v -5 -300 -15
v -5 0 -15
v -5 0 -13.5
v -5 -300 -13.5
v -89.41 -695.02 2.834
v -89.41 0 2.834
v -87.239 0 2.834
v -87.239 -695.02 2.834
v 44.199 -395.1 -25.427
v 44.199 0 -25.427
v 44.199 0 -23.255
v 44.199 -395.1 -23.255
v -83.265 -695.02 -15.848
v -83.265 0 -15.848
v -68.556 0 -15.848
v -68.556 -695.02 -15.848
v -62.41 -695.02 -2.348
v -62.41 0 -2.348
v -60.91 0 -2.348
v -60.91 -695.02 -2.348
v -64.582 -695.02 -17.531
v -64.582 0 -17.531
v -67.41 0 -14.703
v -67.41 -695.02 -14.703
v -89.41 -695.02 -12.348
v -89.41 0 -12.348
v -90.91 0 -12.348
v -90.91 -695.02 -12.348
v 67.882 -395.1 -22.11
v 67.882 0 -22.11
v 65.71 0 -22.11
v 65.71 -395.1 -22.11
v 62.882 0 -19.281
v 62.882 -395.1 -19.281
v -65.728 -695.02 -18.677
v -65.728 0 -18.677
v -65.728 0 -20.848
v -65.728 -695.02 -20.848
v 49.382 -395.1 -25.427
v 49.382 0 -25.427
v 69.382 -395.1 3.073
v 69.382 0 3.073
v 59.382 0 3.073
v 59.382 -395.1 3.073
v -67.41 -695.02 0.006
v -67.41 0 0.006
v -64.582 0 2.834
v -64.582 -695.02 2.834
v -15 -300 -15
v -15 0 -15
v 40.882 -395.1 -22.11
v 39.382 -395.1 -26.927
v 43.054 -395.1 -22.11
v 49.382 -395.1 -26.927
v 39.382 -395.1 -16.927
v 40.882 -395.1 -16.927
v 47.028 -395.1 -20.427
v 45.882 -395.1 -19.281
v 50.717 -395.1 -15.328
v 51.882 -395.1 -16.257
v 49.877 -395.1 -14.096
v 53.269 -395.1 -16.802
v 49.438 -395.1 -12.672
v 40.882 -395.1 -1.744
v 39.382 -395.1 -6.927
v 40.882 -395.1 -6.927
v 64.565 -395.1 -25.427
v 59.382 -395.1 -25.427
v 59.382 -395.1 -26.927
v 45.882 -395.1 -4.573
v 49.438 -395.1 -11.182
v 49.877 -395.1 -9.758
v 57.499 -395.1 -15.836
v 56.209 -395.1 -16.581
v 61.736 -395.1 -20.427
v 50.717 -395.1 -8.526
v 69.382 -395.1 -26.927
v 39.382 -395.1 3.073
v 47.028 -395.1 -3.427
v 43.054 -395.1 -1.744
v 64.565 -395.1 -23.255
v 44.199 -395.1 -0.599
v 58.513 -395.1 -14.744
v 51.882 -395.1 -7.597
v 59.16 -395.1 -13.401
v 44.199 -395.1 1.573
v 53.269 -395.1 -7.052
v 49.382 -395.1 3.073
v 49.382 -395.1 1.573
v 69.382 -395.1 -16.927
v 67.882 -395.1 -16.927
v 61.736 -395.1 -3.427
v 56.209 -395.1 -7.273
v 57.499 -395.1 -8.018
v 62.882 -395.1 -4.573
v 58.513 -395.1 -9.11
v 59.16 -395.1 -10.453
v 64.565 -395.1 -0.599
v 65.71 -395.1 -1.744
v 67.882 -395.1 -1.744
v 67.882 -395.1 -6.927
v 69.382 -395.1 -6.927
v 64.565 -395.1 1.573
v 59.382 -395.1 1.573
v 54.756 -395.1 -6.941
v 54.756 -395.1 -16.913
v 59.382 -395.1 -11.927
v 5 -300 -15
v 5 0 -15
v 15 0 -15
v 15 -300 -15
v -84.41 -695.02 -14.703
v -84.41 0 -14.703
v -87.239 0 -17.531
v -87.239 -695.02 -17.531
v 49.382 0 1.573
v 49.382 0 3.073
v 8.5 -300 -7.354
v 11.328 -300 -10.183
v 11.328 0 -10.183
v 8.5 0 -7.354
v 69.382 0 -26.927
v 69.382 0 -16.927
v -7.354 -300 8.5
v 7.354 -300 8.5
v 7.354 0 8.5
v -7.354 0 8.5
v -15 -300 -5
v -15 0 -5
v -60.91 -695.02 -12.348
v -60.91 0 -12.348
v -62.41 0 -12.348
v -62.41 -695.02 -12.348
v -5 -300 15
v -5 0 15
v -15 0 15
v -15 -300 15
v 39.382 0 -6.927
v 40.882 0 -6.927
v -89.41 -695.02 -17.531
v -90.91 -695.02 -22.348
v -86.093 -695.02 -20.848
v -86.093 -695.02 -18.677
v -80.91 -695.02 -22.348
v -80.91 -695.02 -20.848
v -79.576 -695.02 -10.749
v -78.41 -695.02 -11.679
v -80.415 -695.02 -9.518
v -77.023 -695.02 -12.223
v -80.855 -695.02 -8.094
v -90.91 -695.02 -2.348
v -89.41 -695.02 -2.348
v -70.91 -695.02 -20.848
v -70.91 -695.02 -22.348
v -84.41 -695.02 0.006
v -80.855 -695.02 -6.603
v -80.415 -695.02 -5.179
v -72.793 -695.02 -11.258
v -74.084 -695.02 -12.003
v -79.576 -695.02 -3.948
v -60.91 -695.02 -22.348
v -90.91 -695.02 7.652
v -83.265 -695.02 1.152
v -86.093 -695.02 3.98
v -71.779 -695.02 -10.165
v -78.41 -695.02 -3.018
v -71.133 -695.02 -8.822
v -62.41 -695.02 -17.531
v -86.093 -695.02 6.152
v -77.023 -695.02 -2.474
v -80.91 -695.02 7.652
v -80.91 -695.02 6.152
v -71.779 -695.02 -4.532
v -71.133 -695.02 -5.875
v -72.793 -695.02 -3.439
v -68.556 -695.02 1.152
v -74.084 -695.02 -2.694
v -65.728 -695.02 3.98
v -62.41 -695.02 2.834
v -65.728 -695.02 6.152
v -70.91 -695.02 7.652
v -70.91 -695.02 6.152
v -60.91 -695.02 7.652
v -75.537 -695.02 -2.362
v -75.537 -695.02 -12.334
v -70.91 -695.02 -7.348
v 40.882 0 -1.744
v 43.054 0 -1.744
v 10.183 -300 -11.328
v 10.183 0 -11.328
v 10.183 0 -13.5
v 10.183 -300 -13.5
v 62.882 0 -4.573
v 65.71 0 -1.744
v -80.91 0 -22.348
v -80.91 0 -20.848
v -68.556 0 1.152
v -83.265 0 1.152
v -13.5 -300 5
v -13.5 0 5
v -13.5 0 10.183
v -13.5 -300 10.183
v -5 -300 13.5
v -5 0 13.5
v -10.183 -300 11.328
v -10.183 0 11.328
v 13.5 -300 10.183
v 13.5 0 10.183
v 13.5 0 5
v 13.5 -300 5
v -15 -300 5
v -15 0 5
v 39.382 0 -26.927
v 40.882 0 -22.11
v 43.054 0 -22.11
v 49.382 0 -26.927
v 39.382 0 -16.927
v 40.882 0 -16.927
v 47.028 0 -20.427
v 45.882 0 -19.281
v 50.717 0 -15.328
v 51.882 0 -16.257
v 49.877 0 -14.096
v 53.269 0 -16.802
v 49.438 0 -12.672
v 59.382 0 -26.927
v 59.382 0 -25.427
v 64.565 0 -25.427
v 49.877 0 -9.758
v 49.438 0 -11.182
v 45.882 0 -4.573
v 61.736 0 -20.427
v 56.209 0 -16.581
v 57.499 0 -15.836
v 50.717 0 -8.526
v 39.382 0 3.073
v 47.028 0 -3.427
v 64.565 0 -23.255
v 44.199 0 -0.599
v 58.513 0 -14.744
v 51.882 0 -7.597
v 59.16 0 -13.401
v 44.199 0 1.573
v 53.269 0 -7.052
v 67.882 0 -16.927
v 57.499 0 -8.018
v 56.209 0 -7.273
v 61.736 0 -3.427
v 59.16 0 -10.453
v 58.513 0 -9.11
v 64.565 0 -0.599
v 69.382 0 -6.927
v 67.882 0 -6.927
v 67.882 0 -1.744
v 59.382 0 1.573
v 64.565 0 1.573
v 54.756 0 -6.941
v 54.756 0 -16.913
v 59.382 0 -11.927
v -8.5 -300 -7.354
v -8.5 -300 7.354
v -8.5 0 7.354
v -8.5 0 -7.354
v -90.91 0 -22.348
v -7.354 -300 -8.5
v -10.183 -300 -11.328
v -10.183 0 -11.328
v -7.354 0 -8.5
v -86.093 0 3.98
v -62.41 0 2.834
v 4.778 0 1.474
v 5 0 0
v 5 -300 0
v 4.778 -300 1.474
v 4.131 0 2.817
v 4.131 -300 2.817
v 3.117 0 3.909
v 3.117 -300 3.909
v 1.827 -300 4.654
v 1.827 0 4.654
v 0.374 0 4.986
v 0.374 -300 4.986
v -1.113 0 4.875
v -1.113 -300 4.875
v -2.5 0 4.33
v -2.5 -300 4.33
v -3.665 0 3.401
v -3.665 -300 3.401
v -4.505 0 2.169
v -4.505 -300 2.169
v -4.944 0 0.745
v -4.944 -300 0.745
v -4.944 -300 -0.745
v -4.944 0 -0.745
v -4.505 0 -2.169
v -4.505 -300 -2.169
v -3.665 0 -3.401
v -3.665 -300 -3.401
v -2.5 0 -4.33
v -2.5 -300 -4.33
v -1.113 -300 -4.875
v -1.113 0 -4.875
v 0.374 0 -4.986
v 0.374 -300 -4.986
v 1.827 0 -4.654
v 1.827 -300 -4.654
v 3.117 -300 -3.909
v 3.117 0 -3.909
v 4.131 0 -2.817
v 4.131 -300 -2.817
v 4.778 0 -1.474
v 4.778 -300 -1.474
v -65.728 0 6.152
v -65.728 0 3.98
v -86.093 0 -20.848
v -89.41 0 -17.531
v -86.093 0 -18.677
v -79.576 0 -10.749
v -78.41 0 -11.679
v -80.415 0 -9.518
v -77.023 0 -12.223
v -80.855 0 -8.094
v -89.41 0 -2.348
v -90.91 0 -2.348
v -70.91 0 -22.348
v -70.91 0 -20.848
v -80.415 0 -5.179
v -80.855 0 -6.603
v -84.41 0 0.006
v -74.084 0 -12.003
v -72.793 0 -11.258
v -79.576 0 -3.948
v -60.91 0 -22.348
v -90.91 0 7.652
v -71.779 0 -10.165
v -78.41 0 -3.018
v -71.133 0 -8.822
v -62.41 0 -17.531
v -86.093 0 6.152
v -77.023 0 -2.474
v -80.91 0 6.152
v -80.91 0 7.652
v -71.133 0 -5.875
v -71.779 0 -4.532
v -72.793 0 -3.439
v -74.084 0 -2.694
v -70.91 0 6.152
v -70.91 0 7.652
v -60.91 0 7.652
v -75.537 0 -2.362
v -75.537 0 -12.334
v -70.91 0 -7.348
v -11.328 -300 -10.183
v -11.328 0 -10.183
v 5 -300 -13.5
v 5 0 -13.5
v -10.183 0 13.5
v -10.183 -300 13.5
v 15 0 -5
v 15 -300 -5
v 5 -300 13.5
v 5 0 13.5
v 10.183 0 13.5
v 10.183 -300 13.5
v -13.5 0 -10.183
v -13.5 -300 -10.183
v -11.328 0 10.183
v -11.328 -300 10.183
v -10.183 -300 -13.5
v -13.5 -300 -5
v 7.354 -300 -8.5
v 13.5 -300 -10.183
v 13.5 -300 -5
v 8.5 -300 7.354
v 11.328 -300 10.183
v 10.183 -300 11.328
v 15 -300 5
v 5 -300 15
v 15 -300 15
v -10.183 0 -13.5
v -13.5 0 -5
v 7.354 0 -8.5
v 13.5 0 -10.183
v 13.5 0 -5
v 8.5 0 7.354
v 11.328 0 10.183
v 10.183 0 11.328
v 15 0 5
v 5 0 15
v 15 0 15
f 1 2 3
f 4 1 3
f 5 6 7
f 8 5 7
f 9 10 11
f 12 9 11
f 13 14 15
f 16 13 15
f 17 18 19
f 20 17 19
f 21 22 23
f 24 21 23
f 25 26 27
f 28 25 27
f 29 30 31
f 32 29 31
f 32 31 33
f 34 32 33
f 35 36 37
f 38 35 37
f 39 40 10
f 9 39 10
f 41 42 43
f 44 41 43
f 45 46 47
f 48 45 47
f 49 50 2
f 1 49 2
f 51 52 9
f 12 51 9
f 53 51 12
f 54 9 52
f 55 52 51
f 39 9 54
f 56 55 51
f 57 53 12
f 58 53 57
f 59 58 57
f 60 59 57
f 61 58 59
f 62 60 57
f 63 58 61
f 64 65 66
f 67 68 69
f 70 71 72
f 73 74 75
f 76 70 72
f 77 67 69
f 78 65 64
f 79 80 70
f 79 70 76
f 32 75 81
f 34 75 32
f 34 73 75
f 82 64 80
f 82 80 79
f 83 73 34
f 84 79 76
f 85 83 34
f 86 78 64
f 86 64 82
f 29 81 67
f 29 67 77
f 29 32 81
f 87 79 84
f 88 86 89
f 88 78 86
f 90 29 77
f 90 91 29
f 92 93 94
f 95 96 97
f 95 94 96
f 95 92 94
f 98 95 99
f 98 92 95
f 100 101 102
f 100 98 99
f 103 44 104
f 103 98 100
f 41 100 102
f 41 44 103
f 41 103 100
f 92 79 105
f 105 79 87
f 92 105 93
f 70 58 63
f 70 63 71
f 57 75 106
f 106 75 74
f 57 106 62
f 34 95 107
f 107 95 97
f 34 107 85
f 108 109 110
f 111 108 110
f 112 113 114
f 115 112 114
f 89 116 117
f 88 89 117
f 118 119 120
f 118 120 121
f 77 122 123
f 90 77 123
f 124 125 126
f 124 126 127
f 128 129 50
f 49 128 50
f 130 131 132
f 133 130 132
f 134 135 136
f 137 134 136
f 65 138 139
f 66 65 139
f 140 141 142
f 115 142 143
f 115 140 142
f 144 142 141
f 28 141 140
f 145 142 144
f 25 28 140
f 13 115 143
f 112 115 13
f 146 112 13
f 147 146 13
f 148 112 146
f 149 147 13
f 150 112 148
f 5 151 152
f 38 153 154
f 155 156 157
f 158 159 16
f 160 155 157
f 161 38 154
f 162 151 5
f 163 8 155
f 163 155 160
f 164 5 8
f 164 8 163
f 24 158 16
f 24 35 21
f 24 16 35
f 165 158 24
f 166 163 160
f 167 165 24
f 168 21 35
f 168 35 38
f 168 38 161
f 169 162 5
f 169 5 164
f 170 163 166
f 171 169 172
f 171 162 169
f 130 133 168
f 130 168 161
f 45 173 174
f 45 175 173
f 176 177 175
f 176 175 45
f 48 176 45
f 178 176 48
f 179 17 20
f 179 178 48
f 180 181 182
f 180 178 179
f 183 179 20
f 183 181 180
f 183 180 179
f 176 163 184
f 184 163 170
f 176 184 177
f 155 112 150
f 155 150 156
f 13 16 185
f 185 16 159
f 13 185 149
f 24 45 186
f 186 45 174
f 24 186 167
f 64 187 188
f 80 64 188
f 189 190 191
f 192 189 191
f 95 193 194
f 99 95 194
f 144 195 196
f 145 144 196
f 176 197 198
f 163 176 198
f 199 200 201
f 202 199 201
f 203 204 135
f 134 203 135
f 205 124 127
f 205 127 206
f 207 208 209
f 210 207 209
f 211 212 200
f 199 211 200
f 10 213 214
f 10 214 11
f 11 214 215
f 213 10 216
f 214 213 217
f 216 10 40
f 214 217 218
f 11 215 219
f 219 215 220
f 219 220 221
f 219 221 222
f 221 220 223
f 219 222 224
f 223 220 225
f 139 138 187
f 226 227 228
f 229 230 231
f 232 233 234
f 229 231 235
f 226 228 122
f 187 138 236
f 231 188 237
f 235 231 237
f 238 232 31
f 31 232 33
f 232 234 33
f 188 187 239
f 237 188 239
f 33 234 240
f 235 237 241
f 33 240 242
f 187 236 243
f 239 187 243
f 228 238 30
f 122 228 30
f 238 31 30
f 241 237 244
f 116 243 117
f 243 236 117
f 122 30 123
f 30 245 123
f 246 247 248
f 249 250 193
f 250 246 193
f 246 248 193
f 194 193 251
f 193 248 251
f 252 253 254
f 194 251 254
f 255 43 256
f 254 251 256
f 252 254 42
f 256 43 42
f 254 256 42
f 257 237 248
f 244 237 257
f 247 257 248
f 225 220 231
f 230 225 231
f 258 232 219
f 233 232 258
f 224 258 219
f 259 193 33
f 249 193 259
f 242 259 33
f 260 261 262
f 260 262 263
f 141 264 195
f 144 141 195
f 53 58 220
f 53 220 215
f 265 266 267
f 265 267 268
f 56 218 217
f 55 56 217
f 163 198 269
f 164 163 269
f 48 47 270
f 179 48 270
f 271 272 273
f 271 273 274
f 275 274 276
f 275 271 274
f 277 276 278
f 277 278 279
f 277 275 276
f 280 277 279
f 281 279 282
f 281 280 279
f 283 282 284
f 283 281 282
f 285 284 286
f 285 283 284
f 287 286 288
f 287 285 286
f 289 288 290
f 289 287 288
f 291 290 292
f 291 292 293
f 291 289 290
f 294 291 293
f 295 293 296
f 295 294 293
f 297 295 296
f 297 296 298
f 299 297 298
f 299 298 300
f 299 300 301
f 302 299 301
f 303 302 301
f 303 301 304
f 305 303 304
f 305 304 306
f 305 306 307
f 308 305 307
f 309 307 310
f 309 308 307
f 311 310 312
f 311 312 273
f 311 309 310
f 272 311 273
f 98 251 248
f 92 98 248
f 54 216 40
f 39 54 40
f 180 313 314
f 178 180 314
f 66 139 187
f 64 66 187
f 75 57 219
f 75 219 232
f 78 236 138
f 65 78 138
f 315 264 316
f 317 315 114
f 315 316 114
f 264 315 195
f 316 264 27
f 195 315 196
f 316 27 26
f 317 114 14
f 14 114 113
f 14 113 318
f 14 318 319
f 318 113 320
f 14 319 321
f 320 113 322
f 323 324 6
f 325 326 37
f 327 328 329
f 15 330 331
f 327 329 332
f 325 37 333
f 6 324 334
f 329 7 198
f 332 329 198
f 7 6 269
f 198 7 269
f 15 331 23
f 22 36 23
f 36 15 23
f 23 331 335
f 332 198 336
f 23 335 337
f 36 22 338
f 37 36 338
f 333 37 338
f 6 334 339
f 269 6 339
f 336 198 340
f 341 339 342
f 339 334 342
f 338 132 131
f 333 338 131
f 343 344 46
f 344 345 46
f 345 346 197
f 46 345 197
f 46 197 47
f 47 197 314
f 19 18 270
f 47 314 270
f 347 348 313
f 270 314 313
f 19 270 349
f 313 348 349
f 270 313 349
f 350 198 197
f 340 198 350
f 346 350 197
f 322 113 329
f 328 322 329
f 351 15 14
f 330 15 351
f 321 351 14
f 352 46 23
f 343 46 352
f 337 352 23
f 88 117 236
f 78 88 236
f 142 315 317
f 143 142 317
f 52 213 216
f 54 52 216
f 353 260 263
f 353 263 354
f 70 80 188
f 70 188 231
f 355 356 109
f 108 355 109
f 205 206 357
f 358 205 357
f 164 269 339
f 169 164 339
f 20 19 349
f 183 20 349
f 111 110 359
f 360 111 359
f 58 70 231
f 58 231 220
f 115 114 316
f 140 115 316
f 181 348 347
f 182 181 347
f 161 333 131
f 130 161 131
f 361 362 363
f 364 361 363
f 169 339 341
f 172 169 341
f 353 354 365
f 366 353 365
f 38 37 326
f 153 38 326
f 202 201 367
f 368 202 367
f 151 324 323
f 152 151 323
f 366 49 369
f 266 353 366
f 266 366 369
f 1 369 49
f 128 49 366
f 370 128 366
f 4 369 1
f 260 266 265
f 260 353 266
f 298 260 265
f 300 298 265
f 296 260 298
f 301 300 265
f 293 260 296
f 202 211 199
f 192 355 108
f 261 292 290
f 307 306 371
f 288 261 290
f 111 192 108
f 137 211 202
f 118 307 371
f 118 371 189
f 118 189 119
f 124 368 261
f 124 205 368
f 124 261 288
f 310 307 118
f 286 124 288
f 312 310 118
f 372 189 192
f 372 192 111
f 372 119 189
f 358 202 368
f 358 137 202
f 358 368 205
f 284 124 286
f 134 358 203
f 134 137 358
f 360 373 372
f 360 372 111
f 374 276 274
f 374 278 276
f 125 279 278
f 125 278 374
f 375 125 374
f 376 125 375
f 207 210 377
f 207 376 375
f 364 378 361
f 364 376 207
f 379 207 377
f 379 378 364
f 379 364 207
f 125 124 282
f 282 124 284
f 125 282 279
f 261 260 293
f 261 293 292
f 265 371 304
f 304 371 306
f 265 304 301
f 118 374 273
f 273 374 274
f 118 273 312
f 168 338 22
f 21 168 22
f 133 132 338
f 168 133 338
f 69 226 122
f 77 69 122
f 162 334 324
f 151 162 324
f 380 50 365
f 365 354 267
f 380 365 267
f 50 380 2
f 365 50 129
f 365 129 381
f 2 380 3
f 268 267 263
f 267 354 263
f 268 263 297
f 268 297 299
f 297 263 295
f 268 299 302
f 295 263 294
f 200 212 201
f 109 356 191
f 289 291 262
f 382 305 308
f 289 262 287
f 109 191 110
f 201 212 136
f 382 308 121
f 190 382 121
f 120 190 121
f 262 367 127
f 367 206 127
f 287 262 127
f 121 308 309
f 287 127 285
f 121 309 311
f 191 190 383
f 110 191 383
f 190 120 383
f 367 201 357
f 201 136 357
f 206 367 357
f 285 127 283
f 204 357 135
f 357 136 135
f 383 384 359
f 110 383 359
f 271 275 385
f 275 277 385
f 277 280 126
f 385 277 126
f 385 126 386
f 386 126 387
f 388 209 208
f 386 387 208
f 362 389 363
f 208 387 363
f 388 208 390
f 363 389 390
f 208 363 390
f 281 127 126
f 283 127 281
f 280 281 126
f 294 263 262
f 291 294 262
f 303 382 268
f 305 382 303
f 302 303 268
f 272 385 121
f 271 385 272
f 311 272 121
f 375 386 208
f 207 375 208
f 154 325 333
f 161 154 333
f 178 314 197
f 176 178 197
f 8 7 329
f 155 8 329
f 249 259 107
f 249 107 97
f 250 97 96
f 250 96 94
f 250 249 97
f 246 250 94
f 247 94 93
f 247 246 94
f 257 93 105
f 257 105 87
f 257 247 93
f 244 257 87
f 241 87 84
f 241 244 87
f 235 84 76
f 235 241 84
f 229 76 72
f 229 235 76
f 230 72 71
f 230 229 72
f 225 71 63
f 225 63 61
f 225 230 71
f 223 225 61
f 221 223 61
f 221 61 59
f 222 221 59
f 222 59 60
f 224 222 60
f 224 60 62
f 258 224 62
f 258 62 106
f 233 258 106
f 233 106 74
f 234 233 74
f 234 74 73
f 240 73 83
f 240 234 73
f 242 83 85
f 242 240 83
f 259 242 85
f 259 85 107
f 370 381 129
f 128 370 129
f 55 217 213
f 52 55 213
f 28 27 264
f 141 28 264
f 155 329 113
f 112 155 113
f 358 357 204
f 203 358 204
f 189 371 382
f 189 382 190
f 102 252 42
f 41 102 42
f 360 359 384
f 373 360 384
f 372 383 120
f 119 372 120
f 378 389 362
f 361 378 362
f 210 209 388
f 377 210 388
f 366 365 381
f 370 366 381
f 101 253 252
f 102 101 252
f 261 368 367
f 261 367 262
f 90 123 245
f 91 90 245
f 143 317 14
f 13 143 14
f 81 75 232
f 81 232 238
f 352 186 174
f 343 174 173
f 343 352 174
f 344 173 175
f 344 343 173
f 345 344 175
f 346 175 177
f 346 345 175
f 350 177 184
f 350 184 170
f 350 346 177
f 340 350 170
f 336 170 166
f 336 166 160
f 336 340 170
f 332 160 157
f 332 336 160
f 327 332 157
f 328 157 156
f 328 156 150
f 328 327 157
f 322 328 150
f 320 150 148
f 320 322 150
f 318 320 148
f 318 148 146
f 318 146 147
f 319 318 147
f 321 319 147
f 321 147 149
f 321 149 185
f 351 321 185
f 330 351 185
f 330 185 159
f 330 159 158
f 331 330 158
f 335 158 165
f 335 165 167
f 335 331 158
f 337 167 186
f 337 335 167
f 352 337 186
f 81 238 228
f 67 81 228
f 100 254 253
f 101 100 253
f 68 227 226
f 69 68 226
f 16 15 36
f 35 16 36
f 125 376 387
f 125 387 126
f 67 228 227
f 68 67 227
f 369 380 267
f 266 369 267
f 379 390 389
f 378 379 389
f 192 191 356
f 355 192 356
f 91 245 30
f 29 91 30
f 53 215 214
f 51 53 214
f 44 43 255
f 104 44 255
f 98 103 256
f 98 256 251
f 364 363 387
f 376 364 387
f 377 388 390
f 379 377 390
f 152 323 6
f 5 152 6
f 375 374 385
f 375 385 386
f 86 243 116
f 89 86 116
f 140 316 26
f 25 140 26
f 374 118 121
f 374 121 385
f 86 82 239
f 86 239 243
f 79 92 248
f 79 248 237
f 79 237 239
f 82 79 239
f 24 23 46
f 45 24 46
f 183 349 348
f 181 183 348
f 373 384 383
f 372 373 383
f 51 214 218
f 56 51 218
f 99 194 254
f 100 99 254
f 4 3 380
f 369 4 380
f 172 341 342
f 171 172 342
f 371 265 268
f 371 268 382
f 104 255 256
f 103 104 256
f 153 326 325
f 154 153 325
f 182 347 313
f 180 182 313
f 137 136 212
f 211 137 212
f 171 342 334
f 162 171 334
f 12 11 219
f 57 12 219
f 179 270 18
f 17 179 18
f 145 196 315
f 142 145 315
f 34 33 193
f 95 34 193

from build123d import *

# Parameters (mm, degrees)
F0_R     = 5
F1_DEPTH = 300
F2_R     = 5
F3_DEPTH = 695.02
F4_R     = 5
F5_DEPTH = 395.1


with BuildPart() as f1:
    # F0 (on Front) → F1 (new body)
    with BuildSketch(Plane.XZ):
        Polygon((7.3542486889, 8.5), (0, 8.5), (-7.3542486889, 8.5), (-10.1826758137, 11.3284271247), (-10.1826758137, 13.5), (-5, 13.5), (-5, 15), (-15, 15), (-15, 5), (-13.5, 5), (-13.5, 10.1826758137), (-11.3284271247, 10.1826758137), (-8.5, 7.3542486889), (-8.5, 0), (-8.5, -7.3542486889), (-11.3284271247, -10.1826758137), (-13.5, -10.1826758137), (-13.5, -5), (-15, -5), (-15, -15), (-5, -15), (-5, -13.5), (-10.1826758137, -13.5), (-10.1826758137, -11.3284271247), (-7.3542486889, -8.5), (0, -8.5), (7.3542486889, -8.5), (10.1826758137, -11.3284271247), (10.1826758137, -13.5), (5, -13.5), (5, -15), (15, -15), (15, -5), (13.5, -5), (13.5, -10.1826758137), (11.3284271247, -10.1826758137), (8.5, -7.3542486889), (8.5, 0), (8.5, 7.3542486889), (11.3284271247, 10.1826758137), (13.5, 10.1826758137), (13.5, 5), (15, 5), (15, 15), (5, 15), (5, 13.5), (10.1826758137, 13.5), (10.1826758137, 11.3284271247), align=None)
        Circle(F0_R, mode=Mode.SUBTRACT)
    extrude(amount=F1_DEPTH)


with BuildPart() as f3:
    # F2 (on Front) → F3 (new body)
    with BuildSketch(Plane.XZ):
        Polygon((-68.5562385395, 1.151542255), (-75.9104872284, 1.151542255), (-83.2647359174, 1.151542255), (-86.0931630421, 3.9799693797), (-86.0931630421, 6.151542255), (-80.9104872284, 6.151542255), (-80.9104872284, 7.651542255), (-90.9104872284, 7.651542255), (-90.9104872284, -2.348457745), (-89.4104872284, -2.348457745), (-89.4104872284, 2.8342180686), (-87.2389143532, 2.8342180686), (-84.4104872284, 0.0057909439), (-84.4104872284, -7.348457745), (-84.4104872284, -14.702706434), (-87.2389143532, -17.5311335587), (-89.4104872284, -17.5311335587), (-89.4104872284, -12.348457745), (-90.9104872284, -12.348457745), (-90.9104872284, -22.348457745), (-80.9104872284, -22.348457745), (-80.9104872284, -20.848457745), (-86.0931630421, -20.848457745), (-86.0931630421, -18.6768848698), (-83.2647359174, -15.848457745), (-75.9104872284, -15.848457745), (-68.5562385395, -15.848457745), (-65.7278114147, -18.6768848698), (-65.7278114147, -20.848457745), (-70.9104872284, -20.848457745), (-70.9104872284, -22.348457745), (-60.9104872284, -22.348457745), (-60.9104872284, -12.348457745), (-62.4104872284, -12.348457745), (-62.4104872284, -17.5311335587), (-64.5820601037, -17.5311335587), (-67.4104872284, -14.702706434), (-67.4104872284, -7.348457745), (-67.4104872284, 0.0057909439), (-64.5820601037, 2.8342180686), (-62.4104872284, 2.8342180686), (-62.4104872284, -2.348457745), (-60.9104872284, -2.348457745), (-60.9104872284, 7.651542255), (-70.9104872284, 7.651542255), (-70.9104872284, 6.151542255), (-65.7278114147, 6.151542255), (-65.7278114147, 3.9799693797), align=None)
        with Locations((-75.9104872284, -7.348457745)):
            Circle(F2_R, mode=Mode.SUBTRACT)
    extrude(amount=F3_DEPTH)


with BuildPart() as f5:
    # F4 (on Front) → F5 (new body)
    with BuildSketch(Plane.XZ):
        Polygon((61.7362180576, -3.4269475553), (54.3819693687, -3.4269475553), (47.0277206797, -3.4269475553), (44.199293555, -0.5985204305), (44.199293555, 1.5730524447), (49.3819693687, 1.5730524447), (49.3819693687, 3.0730524447), (39.3819693687, 3.0730524447), (39.3819693687, -6.9269475553), (40.8819693687, -6.9269475553), (40.8819693687, -1.7442717416), (43.0535422439, -1.7442717416), (45.8819693687, -4.5726988663), (45.8819693687, -11.9269475553), (45.8819693687, -19.2811962442), (43.0535422439, -22.1096233689), (40.8819693687, -22.1096233689), (40.8819693687, -16.9269475553), (39.3819693687, -16.9269475553), (39.3819693687, -26.9269475553), (49.3819693687, -26.9269475553), (49.3819693687, -25.4269475553), (44.199293555, -25.4269475553), (44.199293555, -23.25537468), (47.0277206797, -20.4269475553), (54.3819693687, -20.4269475553), (61.7362180576, -20.4269475553), (64.5646451824, -23.25537468), (64.5646451824, -25.4269475553), (59.3819693687, -25.4269475553), (59.3819693687, -26.9269475553), (69.3819693687, -26.9269475553), (69.3819693687, -16.9269475553), (67.8819693687, -16.9269475553), (67.8819693687, -22.1096233689), (65.7103964934, -22.1096233689), (62.8819693687, -19.2811962442), (62.8819693687, -11.9269475553), (62.8819693687, -4.5726988663), (65.7103964934, -1.7442717416), (67.8819693687, -1.7442717416), (67.8819693687, -6.9269475553), (69.3819693687, -6.9269475553), (69.3819693687, 3.0730524447), (59.3819693687, 3.0730524447), (59.3819693687, 1.5730524447), (64.5646451824, 1.5730524447), (64.5646451824, -0.5985204305), align=None)
        with Locations((54.3819693687, -11.9269475553)):
            Circle(F4_R, mode=Mode.SUBTRACT)
    extrude(amount=F5_DEPTH)


solid = Compound([f1.part, f3.part, f5.part])
